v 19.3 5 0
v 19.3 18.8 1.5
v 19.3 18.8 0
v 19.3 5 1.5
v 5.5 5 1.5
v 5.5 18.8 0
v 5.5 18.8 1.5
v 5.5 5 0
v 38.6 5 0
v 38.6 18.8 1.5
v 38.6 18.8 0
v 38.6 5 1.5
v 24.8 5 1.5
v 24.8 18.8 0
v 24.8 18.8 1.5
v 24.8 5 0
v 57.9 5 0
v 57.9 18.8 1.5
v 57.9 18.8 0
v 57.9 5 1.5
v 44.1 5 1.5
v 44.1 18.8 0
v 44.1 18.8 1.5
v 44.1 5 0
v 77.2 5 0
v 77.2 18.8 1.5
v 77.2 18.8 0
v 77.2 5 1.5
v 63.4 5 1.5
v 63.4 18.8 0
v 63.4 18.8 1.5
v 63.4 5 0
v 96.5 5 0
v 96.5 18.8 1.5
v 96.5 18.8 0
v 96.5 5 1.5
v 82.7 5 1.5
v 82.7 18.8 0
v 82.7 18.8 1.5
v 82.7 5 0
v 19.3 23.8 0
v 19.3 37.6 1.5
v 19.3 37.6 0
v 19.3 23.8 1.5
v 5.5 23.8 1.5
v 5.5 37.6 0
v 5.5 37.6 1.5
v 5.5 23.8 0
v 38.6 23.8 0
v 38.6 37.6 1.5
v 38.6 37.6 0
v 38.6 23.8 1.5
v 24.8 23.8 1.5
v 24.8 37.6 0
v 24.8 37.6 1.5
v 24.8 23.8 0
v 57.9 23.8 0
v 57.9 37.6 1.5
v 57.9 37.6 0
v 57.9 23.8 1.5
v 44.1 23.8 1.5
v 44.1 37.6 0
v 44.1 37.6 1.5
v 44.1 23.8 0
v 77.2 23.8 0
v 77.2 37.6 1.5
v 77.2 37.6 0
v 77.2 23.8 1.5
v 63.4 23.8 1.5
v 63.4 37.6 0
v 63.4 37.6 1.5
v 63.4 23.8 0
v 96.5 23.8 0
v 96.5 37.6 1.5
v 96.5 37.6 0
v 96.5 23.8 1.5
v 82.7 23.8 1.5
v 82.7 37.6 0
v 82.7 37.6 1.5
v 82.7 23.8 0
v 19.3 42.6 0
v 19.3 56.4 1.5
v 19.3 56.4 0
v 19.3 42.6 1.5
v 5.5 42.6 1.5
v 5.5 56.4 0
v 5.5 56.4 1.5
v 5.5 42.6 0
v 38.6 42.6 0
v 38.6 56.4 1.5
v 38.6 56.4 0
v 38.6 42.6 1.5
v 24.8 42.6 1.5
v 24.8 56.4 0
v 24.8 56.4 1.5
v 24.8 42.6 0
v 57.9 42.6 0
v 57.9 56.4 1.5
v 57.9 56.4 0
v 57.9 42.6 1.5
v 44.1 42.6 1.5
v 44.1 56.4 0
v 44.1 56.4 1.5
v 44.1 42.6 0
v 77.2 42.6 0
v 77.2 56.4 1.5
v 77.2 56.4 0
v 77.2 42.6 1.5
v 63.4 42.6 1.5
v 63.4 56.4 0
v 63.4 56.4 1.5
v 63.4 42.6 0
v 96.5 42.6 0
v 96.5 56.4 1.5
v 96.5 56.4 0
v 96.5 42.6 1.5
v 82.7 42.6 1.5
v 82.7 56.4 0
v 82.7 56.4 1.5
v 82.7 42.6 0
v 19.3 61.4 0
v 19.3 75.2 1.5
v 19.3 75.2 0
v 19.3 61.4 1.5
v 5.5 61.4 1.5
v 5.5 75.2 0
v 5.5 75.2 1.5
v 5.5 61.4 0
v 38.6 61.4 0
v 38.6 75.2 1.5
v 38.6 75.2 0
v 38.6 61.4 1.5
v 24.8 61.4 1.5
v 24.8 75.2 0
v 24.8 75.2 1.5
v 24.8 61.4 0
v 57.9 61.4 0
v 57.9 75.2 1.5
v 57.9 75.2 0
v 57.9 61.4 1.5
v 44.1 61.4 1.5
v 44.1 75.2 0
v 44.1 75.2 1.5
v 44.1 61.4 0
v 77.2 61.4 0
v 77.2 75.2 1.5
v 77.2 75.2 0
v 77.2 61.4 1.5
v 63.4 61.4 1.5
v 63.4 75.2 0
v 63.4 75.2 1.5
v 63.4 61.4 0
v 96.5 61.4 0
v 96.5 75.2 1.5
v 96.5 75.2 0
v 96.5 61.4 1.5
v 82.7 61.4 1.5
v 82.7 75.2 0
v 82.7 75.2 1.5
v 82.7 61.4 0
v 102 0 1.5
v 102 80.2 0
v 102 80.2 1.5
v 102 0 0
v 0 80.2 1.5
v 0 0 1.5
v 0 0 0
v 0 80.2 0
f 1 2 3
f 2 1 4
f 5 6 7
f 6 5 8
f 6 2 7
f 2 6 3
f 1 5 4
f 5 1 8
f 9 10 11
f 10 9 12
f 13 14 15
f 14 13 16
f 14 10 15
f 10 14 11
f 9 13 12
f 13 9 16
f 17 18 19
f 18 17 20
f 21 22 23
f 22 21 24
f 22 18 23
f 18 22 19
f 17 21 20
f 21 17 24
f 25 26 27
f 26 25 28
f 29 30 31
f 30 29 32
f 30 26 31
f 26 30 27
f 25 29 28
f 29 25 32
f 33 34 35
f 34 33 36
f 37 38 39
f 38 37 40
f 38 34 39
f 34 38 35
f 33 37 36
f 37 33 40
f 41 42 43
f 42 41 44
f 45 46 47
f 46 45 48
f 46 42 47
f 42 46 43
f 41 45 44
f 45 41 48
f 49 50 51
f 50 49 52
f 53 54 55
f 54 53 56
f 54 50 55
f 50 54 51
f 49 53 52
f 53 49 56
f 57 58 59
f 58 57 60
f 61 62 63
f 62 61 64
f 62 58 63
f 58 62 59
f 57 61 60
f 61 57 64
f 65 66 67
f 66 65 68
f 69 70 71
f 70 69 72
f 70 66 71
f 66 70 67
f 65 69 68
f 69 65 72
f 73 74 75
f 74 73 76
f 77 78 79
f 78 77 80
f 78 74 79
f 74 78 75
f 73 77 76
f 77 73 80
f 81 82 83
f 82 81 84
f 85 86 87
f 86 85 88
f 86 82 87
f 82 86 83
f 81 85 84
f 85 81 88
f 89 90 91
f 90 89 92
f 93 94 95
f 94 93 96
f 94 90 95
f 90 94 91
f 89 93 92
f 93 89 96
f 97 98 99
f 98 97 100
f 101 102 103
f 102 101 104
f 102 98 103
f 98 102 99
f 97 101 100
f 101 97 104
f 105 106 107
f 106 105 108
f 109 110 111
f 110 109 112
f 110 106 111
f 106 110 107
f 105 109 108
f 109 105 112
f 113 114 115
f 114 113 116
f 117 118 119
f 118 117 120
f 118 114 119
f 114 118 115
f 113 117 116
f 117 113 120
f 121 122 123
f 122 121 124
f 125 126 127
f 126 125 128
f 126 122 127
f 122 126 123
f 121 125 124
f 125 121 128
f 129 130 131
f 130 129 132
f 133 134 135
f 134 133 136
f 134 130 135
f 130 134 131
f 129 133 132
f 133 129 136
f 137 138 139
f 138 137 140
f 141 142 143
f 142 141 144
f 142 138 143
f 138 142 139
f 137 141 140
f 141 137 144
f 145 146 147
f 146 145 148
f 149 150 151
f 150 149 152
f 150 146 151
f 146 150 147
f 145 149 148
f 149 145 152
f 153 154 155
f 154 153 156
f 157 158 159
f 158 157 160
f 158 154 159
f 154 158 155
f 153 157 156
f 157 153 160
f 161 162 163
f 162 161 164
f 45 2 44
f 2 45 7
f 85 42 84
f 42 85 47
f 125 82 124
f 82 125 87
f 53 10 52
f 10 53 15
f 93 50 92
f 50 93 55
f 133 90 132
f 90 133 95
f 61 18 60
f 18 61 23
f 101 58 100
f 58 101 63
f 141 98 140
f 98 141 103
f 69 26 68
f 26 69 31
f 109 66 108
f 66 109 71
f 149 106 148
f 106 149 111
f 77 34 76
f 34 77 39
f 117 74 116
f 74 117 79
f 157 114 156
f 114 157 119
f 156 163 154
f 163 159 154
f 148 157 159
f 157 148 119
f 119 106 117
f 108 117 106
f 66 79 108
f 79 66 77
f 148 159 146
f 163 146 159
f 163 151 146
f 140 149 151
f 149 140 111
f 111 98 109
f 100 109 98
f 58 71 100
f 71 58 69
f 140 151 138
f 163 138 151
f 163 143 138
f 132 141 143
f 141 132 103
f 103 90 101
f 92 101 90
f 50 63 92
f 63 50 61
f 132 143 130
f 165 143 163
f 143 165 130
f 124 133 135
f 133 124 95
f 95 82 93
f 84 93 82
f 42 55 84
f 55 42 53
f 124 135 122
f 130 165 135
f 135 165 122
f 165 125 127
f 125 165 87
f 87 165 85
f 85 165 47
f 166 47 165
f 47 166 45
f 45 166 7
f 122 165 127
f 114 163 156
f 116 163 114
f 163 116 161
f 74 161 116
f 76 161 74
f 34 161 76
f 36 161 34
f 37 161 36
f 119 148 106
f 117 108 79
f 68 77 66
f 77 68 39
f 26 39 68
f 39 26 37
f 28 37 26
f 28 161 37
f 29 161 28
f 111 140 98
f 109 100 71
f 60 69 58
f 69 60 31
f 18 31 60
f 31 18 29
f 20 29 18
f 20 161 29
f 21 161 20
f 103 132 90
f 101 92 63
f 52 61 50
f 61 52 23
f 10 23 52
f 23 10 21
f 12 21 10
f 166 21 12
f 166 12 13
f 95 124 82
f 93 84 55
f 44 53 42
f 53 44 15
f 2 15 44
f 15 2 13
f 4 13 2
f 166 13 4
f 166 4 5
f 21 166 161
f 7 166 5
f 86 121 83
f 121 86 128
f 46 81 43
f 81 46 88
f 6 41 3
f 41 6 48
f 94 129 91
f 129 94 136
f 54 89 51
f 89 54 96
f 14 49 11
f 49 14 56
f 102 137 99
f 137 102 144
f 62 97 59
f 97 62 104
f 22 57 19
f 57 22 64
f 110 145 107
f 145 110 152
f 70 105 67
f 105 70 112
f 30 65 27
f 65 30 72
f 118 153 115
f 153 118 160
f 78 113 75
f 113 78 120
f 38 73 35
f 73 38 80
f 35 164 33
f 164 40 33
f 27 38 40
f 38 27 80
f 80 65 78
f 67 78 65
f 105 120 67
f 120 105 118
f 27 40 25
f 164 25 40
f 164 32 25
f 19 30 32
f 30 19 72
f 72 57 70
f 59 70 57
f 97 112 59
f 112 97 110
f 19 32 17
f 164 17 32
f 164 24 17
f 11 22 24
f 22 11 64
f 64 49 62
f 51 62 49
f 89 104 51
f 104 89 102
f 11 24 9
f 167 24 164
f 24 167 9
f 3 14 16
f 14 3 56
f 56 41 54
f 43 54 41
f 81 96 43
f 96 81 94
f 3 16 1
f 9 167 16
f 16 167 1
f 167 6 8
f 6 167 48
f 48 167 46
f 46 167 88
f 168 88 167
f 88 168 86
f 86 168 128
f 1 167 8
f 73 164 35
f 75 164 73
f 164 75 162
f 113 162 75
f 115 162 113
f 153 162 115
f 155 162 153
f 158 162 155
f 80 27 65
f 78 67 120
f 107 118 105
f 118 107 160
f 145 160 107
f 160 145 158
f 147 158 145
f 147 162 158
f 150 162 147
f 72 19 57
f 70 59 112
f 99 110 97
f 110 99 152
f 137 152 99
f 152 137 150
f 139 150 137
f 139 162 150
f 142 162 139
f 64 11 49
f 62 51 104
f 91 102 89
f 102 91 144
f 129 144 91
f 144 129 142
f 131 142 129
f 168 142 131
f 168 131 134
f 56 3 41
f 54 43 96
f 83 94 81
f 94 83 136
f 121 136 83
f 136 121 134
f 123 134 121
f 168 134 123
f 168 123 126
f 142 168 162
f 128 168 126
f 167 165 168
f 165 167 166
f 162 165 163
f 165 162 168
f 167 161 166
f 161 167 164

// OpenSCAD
two_dimentional = false;
thickness       = 1.5;

cols        = 5; 
rows        = 4;

hole_w      = 13.8;  
hole_h      = 13.8; // remove commment once confirmed

outer_border_x    = 0;
outer_border_y    = 0;

spacer_w    = 5.5;  // remove commment once confirmed
spacer_h    = 5;    // remove commment once confirmed

plate_w     = spacer_w + ( cols * (spacer_w + hole_w) + outer_border_x * 2);
plate_h     = spacer_h + ( rows * (spacer_h + hole_h) + outer_border_y * 2); 

plate_size  = [plate_w,plate_h,thickness];
hole_size   = [hole_w, hole_h, thickness * 3];

module generate_3d_plate(){
    difference(){
        cube(plate_size, center =   false);
        
        for (row = [0:rows-1]) {
            for (col = [0:cols-1]) {
                translate(
                    [ outer_border_x + spacer_w + (spacer_w * col) + (hole_w * col),
                      outer_border_y + spacer_h + (spacer_h * row) + (hole_h * row),
                      -1 ]
                )
                    cube(hole_size, center = false);
            }
        }        
    }
}

module generate_2d_plate(){
    difference(){
        plate_size2 = [plate_size[0], plate_size[1]];
        hole_size2  = [hole_size[0],  hole_size[1] ];
        
        square(plate_size2, center =   false);
        
        for (row = [0:rows-1]) {
            for (col = [0:cols-1]) {
                translate(
                    [ outer_border_x + spacer_w + (spacer_w * col) + (hole_w * col),
                      outer_border_y + spacer_h + (spacer_h * row) + (hole_h * row)]
                )
                    square(hole_size2, center = false);
            }
        }        
    }
}

if (two_dimentional){
    generate_2d_plate();
} else {
    generate_3d_plate();
}

// made by Rebekah Hellberg [insert witty line about it not having been vibe coded]
